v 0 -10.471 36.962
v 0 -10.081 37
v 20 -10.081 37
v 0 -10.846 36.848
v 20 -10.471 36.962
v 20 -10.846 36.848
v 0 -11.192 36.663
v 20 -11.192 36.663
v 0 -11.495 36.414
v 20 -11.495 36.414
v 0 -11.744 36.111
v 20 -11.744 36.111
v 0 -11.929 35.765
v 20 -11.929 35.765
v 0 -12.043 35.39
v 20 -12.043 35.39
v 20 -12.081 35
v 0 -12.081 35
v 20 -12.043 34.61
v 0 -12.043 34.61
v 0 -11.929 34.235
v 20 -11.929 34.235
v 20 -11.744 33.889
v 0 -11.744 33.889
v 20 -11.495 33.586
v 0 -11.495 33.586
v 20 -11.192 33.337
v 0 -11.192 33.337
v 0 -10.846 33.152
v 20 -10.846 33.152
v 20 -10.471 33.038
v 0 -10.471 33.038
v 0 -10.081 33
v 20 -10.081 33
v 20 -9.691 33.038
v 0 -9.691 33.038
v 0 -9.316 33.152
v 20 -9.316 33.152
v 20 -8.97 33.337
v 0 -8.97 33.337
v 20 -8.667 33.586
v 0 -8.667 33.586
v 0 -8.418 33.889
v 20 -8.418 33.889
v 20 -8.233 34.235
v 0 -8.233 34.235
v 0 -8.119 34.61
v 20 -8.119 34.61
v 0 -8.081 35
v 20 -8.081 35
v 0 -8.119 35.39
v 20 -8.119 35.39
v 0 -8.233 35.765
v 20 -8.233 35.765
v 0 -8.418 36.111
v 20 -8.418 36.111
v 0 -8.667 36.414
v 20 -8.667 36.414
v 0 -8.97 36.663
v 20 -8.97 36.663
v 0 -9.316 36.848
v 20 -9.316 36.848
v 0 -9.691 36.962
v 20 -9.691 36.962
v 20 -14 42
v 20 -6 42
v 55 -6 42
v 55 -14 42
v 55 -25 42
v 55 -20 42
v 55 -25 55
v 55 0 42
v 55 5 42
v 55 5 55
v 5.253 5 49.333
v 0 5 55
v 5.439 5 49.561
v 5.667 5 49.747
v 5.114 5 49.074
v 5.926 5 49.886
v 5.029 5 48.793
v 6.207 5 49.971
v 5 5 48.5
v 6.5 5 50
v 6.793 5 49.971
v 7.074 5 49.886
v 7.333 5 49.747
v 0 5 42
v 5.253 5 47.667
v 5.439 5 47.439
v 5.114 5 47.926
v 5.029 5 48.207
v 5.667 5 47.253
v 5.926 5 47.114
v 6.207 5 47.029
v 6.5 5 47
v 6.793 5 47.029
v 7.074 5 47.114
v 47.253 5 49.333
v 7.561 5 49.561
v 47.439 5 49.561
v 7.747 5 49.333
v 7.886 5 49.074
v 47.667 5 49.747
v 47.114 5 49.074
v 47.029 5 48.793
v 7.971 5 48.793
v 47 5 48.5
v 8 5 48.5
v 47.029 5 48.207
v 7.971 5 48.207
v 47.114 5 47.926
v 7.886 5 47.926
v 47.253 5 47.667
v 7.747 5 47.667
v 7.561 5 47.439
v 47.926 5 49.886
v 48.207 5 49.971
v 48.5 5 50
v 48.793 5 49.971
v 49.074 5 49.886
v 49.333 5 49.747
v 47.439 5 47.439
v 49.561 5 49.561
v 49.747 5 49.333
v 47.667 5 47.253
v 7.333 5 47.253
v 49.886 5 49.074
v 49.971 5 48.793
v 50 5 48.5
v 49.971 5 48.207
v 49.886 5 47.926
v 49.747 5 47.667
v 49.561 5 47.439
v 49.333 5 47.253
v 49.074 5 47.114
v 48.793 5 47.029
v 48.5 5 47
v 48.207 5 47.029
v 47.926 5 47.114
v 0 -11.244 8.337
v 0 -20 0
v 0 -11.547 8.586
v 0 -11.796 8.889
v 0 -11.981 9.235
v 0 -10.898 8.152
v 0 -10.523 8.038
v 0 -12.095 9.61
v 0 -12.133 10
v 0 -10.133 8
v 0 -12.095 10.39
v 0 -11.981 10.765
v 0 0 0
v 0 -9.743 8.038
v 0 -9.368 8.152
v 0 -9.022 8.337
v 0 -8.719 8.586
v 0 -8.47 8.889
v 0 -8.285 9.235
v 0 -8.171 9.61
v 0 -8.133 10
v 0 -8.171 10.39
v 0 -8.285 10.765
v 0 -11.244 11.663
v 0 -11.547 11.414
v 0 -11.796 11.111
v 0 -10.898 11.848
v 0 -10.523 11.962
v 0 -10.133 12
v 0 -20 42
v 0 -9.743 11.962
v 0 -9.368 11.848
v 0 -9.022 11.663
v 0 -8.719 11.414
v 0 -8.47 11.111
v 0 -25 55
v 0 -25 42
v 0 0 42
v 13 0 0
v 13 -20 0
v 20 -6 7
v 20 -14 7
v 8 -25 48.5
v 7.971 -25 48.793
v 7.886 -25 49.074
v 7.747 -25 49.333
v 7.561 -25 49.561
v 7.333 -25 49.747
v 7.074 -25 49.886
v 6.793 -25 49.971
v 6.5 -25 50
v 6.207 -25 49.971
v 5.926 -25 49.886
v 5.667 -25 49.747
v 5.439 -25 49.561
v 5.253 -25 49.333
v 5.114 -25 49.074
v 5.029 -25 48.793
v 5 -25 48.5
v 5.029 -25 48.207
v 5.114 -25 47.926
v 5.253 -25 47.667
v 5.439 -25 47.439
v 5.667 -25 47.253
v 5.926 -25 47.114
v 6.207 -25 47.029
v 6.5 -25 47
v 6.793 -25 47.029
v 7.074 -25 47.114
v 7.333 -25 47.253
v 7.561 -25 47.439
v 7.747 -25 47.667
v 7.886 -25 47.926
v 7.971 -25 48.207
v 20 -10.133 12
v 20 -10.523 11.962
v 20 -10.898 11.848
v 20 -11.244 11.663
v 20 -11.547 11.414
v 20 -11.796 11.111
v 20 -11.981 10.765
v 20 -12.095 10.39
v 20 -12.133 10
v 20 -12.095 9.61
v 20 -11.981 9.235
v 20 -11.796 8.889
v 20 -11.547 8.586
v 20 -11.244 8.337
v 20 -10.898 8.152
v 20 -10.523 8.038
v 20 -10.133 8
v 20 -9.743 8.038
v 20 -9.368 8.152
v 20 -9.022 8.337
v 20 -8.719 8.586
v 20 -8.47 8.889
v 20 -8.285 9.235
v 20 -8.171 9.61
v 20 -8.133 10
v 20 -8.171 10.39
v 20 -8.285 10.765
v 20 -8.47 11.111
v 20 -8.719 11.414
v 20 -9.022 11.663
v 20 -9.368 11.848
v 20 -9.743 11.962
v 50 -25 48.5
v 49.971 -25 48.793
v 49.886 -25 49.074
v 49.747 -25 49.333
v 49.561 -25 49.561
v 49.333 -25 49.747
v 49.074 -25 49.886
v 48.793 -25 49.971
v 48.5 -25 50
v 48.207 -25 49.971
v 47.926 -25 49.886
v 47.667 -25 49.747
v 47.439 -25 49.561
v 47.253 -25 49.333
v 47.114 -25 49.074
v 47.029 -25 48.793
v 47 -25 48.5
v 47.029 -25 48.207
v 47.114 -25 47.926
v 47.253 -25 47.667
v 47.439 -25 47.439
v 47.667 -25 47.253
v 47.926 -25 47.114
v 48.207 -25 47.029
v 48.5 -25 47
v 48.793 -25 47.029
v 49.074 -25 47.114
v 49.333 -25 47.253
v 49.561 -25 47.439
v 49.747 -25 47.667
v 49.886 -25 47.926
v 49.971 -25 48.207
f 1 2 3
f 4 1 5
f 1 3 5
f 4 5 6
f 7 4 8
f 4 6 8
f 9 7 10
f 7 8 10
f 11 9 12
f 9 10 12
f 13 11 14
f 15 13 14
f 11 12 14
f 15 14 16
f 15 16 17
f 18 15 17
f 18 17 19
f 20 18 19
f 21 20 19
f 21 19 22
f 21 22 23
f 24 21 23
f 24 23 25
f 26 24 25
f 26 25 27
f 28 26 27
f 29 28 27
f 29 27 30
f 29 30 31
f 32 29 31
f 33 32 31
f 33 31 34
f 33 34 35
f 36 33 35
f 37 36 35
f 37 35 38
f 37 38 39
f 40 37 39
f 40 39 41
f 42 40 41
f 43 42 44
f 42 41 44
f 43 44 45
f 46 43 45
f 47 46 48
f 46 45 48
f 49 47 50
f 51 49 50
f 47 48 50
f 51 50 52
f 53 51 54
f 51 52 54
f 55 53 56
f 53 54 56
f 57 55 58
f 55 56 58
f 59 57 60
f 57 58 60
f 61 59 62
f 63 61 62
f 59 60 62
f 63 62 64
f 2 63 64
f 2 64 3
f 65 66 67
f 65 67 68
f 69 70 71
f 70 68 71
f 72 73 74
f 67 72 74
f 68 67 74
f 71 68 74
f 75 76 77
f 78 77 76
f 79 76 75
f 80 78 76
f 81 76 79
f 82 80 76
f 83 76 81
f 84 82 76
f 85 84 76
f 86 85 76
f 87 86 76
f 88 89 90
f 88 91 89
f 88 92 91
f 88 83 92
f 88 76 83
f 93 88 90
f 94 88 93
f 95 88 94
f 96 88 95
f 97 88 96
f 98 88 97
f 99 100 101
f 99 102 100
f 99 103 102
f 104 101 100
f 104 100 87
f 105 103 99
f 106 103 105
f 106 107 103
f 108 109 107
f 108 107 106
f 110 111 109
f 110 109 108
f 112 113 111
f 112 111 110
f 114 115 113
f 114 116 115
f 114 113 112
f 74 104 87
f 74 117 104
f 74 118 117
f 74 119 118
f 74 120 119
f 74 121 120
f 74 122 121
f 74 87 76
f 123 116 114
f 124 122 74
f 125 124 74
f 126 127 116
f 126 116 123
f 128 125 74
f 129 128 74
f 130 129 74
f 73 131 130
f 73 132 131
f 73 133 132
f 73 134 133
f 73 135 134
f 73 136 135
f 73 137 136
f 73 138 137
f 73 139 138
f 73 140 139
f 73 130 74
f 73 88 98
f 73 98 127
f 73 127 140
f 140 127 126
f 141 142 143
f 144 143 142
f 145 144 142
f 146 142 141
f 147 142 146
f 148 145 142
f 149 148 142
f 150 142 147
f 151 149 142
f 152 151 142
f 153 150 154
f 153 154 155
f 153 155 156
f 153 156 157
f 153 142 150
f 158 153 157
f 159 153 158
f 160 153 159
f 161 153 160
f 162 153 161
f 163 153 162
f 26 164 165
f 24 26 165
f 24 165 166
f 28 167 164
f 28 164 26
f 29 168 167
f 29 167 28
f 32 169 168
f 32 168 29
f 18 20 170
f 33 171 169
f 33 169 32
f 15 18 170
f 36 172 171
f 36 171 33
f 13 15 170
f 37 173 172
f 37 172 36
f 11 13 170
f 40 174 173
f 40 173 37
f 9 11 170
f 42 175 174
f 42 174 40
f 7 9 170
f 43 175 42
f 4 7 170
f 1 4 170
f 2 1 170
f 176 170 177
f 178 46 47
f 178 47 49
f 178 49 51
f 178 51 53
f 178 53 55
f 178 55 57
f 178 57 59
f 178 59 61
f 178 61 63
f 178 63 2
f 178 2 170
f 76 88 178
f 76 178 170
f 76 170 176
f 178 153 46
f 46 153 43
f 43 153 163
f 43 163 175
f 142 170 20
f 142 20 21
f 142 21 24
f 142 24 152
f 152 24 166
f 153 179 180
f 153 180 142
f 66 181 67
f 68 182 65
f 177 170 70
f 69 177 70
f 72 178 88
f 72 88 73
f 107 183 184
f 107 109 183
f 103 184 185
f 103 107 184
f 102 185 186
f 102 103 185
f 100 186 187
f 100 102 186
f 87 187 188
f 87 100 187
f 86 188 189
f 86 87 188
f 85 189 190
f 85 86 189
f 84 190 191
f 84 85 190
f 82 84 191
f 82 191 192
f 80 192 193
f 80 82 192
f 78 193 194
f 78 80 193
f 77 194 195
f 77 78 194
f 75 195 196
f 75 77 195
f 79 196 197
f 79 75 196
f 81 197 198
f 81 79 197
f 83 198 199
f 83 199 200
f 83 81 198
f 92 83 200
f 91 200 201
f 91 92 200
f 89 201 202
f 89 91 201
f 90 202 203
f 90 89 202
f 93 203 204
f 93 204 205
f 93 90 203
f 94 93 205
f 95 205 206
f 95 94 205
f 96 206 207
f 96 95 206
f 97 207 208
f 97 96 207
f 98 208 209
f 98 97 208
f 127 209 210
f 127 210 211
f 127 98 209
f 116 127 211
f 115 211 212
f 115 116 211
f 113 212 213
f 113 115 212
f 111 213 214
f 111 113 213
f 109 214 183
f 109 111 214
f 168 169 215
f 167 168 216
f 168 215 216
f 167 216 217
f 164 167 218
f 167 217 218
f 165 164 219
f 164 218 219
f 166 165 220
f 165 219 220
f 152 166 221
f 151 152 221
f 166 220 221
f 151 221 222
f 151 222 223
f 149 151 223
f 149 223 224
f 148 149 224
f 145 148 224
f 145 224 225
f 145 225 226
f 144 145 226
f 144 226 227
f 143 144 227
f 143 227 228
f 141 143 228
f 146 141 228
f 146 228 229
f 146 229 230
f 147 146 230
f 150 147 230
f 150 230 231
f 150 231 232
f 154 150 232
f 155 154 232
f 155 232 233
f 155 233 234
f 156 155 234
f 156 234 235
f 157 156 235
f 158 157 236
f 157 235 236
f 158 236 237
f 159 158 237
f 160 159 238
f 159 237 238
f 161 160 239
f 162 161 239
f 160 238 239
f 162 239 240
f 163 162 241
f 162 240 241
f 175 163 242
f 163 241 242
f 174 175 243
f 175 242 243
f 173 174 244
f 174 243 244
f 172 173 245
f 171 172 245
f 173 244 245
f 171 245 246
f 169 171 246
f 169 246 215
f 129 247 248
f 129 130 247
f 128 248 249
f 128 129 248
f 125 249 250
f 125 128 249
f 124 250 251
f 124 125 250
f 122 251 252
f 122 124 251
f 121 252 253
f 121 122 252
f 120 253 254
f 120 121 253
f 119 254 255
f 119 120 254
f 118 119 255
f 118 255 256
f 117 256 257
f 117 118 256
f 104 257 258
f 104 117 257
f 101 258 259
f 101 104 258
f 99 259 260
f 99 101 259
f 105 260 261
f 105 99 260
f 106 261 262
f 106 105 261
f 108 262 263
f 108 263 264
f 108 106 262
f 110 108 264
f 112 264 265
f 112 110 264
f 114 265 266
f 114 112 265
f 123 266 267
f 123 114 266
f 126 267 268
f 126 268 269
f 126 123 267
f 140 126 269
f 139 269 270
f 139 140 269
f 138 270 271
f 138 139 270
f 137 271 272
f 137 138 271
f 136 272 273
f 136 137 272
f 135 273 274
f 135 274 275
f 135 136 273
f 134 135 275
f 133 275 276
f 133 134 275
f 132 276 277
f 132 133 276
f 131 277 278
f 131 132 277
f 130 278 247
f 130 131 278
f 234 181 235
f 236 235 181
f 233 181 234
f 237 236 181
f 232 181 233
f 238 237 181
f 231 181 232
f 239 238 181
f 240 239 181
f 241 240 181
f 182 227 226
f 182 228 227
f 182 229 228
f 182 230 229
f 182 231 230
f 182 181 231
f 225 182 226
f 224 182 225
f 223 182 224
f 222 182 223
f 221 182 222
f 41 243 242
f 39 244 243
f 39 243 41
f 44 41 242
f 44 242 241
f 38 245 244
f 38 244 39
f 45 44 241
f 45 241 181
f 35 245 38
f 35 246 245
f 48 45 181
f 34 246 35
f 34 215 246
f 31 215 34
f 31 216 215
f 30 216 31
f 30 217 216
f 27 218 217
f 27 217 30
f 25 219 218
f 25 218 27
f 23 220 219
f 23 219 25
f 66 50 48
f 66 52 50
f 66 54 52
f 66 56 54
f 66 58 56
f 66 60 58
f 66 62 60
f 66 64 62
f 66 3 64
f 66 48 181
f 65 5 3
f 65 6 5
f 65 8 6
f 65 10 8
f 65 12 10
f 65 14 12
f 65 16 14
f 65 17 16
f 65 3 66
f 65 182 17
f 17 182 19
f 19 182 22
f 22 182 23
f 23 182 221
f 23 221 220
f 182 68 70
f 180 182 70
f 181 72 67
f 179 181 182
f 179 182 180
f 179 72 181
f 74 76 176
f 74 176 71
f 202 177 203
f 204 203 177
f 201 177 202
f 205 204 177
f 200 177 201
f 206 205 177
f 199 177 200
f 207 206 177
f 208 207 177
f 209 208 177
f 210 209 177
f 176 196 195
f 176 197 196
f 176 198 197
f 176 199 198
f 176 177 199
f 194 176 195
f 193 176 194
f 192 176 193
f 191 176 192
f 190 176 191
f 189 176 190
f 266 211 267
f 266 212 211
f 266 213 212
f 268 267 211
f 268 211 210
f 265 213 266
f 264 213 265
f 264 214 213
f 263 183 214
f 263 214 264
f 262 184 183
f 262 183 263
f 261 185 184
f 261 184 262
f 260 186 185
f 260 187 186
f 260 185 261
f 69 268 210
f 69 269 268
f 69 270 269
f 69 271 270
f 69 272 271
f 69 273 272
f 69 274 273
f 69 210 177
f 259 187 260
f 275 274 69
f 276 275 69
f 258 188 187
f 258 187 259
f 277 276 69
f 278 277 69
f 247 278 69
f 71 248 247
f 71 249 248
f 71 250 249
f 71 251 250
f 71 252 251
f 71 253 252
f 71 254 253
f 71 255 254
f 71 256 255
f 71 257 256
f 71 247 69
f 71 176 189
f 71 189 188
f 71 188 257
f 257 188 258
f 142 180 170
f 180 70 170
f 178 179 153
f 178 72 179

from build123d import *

# Parameters (mm, degrees)
PAD_DEPTH     = 20
SKETCH001_W   = 42
SKETCH001_H   = 8
POCKET_DEPTH  = 35
SKETCH002_R   = 2
HOLE_DEPTH    = 25
SKETCH003_R   = 1.5
HOLE001_DEPTH = 25
SKETCH004_W   = 55
SKETCH004_H   = 13
SKETCH004_R   = 1.5
PAD001_DEPTH  = 5
SKETCH005_W   = 55
SKETCH005_H   = 13
SKETCH005_R   = 1.5
PAD002_DEPTH  = 5


with BuildPart() as part:
    # Sketch → Pad (new body)
    with BuildSketch(Plane.XZ):
        Polygon((0, 0), (0, 55), (55, 55), (55, 42), (13, 0), align=None)
    extrude(amount=PAD_DEPTH)

    # Sketch001 (on Face3 of Pad) → Pocket (cut)
    with BuildSketch(Plane(origin=(55, 0, 0), x_dir=(0, 0, 1), z_dir=(1, 0, 0))):
        with Locations((21, 10)):
            Rectangle(SKETCH001_W, SKETCH001_H)
    extrude(amount=-POCKET_DEPTH, mode=Mode.SUBTRACT)

    # Sketch002 (on Face9 of Pocket) → Hole (cut)
    with BuildSketch(Plane(origin=(20, 0, 0), x_dir=(0, 0, 1), z_dir=(1, 0, 0))):
        with Locations((10, 10.133)):
            Circle(SKETCH002_R)
        with Locations((35, 10.080937)):
            Circle(SKETCH002_R)
    extrude(amount=-HOLE_DEPTH, mode=Mode.SUBTRACT)

    # Sketch003 (on Face4 of Hole) → Hole001 (cut)
    with BuildSketch(Plane.XZ.offset(20)):
        with Locations((6.5, 48.5)):
            Circle(SKETCH003_R)
        with Locations((48.5, 48.5)):
            Circle(SKETCH003_R)
    extrude(amount=-HOLE001_DEPTH, mode=Mode.SUBTRACT)

    # Sketch004 (on Face3 of Hole001) → Pad001 (join)
    with BuildSketch(Plane(origin=(0, 0, 0), x_dir=(1, 0, 0), z_dir=(0, 1, 0))):
        with Locations((27.5, -48.5)):
            Rectangle(SKETCH004_W, SKETCH004_H)
        with Locations((6.5, -48.5)):
            Circle(SKETCH004_R, mode=Mode.SUBTRACT)
        with Locations((48.5, -48.5)):
            Circle(SKETCH004_R, mode=Mode.SUBTRACT)
    extrude(amount=PAD001_DEPTH)

    # Sketch005 (on Face3 of Pad001) → Pad002 (join)
    with BuildSketch(Plane.XZ.offset(20)):
        with Locations((27.5, 48.5)):
            Rectangle(SKETCH005_W, SKETCH005_H)
        with Locations((6.5, 48.5)):
            Circle(SKETCH005_R, mode=Mode.SUBTRACT)
        with Locations((48.5, 48.5)):
            Circle(SKETCH005_R, mode=Mode.SUBTRACT)
    extrude(amount=PAD002_DEPTH)


solid = part.part
